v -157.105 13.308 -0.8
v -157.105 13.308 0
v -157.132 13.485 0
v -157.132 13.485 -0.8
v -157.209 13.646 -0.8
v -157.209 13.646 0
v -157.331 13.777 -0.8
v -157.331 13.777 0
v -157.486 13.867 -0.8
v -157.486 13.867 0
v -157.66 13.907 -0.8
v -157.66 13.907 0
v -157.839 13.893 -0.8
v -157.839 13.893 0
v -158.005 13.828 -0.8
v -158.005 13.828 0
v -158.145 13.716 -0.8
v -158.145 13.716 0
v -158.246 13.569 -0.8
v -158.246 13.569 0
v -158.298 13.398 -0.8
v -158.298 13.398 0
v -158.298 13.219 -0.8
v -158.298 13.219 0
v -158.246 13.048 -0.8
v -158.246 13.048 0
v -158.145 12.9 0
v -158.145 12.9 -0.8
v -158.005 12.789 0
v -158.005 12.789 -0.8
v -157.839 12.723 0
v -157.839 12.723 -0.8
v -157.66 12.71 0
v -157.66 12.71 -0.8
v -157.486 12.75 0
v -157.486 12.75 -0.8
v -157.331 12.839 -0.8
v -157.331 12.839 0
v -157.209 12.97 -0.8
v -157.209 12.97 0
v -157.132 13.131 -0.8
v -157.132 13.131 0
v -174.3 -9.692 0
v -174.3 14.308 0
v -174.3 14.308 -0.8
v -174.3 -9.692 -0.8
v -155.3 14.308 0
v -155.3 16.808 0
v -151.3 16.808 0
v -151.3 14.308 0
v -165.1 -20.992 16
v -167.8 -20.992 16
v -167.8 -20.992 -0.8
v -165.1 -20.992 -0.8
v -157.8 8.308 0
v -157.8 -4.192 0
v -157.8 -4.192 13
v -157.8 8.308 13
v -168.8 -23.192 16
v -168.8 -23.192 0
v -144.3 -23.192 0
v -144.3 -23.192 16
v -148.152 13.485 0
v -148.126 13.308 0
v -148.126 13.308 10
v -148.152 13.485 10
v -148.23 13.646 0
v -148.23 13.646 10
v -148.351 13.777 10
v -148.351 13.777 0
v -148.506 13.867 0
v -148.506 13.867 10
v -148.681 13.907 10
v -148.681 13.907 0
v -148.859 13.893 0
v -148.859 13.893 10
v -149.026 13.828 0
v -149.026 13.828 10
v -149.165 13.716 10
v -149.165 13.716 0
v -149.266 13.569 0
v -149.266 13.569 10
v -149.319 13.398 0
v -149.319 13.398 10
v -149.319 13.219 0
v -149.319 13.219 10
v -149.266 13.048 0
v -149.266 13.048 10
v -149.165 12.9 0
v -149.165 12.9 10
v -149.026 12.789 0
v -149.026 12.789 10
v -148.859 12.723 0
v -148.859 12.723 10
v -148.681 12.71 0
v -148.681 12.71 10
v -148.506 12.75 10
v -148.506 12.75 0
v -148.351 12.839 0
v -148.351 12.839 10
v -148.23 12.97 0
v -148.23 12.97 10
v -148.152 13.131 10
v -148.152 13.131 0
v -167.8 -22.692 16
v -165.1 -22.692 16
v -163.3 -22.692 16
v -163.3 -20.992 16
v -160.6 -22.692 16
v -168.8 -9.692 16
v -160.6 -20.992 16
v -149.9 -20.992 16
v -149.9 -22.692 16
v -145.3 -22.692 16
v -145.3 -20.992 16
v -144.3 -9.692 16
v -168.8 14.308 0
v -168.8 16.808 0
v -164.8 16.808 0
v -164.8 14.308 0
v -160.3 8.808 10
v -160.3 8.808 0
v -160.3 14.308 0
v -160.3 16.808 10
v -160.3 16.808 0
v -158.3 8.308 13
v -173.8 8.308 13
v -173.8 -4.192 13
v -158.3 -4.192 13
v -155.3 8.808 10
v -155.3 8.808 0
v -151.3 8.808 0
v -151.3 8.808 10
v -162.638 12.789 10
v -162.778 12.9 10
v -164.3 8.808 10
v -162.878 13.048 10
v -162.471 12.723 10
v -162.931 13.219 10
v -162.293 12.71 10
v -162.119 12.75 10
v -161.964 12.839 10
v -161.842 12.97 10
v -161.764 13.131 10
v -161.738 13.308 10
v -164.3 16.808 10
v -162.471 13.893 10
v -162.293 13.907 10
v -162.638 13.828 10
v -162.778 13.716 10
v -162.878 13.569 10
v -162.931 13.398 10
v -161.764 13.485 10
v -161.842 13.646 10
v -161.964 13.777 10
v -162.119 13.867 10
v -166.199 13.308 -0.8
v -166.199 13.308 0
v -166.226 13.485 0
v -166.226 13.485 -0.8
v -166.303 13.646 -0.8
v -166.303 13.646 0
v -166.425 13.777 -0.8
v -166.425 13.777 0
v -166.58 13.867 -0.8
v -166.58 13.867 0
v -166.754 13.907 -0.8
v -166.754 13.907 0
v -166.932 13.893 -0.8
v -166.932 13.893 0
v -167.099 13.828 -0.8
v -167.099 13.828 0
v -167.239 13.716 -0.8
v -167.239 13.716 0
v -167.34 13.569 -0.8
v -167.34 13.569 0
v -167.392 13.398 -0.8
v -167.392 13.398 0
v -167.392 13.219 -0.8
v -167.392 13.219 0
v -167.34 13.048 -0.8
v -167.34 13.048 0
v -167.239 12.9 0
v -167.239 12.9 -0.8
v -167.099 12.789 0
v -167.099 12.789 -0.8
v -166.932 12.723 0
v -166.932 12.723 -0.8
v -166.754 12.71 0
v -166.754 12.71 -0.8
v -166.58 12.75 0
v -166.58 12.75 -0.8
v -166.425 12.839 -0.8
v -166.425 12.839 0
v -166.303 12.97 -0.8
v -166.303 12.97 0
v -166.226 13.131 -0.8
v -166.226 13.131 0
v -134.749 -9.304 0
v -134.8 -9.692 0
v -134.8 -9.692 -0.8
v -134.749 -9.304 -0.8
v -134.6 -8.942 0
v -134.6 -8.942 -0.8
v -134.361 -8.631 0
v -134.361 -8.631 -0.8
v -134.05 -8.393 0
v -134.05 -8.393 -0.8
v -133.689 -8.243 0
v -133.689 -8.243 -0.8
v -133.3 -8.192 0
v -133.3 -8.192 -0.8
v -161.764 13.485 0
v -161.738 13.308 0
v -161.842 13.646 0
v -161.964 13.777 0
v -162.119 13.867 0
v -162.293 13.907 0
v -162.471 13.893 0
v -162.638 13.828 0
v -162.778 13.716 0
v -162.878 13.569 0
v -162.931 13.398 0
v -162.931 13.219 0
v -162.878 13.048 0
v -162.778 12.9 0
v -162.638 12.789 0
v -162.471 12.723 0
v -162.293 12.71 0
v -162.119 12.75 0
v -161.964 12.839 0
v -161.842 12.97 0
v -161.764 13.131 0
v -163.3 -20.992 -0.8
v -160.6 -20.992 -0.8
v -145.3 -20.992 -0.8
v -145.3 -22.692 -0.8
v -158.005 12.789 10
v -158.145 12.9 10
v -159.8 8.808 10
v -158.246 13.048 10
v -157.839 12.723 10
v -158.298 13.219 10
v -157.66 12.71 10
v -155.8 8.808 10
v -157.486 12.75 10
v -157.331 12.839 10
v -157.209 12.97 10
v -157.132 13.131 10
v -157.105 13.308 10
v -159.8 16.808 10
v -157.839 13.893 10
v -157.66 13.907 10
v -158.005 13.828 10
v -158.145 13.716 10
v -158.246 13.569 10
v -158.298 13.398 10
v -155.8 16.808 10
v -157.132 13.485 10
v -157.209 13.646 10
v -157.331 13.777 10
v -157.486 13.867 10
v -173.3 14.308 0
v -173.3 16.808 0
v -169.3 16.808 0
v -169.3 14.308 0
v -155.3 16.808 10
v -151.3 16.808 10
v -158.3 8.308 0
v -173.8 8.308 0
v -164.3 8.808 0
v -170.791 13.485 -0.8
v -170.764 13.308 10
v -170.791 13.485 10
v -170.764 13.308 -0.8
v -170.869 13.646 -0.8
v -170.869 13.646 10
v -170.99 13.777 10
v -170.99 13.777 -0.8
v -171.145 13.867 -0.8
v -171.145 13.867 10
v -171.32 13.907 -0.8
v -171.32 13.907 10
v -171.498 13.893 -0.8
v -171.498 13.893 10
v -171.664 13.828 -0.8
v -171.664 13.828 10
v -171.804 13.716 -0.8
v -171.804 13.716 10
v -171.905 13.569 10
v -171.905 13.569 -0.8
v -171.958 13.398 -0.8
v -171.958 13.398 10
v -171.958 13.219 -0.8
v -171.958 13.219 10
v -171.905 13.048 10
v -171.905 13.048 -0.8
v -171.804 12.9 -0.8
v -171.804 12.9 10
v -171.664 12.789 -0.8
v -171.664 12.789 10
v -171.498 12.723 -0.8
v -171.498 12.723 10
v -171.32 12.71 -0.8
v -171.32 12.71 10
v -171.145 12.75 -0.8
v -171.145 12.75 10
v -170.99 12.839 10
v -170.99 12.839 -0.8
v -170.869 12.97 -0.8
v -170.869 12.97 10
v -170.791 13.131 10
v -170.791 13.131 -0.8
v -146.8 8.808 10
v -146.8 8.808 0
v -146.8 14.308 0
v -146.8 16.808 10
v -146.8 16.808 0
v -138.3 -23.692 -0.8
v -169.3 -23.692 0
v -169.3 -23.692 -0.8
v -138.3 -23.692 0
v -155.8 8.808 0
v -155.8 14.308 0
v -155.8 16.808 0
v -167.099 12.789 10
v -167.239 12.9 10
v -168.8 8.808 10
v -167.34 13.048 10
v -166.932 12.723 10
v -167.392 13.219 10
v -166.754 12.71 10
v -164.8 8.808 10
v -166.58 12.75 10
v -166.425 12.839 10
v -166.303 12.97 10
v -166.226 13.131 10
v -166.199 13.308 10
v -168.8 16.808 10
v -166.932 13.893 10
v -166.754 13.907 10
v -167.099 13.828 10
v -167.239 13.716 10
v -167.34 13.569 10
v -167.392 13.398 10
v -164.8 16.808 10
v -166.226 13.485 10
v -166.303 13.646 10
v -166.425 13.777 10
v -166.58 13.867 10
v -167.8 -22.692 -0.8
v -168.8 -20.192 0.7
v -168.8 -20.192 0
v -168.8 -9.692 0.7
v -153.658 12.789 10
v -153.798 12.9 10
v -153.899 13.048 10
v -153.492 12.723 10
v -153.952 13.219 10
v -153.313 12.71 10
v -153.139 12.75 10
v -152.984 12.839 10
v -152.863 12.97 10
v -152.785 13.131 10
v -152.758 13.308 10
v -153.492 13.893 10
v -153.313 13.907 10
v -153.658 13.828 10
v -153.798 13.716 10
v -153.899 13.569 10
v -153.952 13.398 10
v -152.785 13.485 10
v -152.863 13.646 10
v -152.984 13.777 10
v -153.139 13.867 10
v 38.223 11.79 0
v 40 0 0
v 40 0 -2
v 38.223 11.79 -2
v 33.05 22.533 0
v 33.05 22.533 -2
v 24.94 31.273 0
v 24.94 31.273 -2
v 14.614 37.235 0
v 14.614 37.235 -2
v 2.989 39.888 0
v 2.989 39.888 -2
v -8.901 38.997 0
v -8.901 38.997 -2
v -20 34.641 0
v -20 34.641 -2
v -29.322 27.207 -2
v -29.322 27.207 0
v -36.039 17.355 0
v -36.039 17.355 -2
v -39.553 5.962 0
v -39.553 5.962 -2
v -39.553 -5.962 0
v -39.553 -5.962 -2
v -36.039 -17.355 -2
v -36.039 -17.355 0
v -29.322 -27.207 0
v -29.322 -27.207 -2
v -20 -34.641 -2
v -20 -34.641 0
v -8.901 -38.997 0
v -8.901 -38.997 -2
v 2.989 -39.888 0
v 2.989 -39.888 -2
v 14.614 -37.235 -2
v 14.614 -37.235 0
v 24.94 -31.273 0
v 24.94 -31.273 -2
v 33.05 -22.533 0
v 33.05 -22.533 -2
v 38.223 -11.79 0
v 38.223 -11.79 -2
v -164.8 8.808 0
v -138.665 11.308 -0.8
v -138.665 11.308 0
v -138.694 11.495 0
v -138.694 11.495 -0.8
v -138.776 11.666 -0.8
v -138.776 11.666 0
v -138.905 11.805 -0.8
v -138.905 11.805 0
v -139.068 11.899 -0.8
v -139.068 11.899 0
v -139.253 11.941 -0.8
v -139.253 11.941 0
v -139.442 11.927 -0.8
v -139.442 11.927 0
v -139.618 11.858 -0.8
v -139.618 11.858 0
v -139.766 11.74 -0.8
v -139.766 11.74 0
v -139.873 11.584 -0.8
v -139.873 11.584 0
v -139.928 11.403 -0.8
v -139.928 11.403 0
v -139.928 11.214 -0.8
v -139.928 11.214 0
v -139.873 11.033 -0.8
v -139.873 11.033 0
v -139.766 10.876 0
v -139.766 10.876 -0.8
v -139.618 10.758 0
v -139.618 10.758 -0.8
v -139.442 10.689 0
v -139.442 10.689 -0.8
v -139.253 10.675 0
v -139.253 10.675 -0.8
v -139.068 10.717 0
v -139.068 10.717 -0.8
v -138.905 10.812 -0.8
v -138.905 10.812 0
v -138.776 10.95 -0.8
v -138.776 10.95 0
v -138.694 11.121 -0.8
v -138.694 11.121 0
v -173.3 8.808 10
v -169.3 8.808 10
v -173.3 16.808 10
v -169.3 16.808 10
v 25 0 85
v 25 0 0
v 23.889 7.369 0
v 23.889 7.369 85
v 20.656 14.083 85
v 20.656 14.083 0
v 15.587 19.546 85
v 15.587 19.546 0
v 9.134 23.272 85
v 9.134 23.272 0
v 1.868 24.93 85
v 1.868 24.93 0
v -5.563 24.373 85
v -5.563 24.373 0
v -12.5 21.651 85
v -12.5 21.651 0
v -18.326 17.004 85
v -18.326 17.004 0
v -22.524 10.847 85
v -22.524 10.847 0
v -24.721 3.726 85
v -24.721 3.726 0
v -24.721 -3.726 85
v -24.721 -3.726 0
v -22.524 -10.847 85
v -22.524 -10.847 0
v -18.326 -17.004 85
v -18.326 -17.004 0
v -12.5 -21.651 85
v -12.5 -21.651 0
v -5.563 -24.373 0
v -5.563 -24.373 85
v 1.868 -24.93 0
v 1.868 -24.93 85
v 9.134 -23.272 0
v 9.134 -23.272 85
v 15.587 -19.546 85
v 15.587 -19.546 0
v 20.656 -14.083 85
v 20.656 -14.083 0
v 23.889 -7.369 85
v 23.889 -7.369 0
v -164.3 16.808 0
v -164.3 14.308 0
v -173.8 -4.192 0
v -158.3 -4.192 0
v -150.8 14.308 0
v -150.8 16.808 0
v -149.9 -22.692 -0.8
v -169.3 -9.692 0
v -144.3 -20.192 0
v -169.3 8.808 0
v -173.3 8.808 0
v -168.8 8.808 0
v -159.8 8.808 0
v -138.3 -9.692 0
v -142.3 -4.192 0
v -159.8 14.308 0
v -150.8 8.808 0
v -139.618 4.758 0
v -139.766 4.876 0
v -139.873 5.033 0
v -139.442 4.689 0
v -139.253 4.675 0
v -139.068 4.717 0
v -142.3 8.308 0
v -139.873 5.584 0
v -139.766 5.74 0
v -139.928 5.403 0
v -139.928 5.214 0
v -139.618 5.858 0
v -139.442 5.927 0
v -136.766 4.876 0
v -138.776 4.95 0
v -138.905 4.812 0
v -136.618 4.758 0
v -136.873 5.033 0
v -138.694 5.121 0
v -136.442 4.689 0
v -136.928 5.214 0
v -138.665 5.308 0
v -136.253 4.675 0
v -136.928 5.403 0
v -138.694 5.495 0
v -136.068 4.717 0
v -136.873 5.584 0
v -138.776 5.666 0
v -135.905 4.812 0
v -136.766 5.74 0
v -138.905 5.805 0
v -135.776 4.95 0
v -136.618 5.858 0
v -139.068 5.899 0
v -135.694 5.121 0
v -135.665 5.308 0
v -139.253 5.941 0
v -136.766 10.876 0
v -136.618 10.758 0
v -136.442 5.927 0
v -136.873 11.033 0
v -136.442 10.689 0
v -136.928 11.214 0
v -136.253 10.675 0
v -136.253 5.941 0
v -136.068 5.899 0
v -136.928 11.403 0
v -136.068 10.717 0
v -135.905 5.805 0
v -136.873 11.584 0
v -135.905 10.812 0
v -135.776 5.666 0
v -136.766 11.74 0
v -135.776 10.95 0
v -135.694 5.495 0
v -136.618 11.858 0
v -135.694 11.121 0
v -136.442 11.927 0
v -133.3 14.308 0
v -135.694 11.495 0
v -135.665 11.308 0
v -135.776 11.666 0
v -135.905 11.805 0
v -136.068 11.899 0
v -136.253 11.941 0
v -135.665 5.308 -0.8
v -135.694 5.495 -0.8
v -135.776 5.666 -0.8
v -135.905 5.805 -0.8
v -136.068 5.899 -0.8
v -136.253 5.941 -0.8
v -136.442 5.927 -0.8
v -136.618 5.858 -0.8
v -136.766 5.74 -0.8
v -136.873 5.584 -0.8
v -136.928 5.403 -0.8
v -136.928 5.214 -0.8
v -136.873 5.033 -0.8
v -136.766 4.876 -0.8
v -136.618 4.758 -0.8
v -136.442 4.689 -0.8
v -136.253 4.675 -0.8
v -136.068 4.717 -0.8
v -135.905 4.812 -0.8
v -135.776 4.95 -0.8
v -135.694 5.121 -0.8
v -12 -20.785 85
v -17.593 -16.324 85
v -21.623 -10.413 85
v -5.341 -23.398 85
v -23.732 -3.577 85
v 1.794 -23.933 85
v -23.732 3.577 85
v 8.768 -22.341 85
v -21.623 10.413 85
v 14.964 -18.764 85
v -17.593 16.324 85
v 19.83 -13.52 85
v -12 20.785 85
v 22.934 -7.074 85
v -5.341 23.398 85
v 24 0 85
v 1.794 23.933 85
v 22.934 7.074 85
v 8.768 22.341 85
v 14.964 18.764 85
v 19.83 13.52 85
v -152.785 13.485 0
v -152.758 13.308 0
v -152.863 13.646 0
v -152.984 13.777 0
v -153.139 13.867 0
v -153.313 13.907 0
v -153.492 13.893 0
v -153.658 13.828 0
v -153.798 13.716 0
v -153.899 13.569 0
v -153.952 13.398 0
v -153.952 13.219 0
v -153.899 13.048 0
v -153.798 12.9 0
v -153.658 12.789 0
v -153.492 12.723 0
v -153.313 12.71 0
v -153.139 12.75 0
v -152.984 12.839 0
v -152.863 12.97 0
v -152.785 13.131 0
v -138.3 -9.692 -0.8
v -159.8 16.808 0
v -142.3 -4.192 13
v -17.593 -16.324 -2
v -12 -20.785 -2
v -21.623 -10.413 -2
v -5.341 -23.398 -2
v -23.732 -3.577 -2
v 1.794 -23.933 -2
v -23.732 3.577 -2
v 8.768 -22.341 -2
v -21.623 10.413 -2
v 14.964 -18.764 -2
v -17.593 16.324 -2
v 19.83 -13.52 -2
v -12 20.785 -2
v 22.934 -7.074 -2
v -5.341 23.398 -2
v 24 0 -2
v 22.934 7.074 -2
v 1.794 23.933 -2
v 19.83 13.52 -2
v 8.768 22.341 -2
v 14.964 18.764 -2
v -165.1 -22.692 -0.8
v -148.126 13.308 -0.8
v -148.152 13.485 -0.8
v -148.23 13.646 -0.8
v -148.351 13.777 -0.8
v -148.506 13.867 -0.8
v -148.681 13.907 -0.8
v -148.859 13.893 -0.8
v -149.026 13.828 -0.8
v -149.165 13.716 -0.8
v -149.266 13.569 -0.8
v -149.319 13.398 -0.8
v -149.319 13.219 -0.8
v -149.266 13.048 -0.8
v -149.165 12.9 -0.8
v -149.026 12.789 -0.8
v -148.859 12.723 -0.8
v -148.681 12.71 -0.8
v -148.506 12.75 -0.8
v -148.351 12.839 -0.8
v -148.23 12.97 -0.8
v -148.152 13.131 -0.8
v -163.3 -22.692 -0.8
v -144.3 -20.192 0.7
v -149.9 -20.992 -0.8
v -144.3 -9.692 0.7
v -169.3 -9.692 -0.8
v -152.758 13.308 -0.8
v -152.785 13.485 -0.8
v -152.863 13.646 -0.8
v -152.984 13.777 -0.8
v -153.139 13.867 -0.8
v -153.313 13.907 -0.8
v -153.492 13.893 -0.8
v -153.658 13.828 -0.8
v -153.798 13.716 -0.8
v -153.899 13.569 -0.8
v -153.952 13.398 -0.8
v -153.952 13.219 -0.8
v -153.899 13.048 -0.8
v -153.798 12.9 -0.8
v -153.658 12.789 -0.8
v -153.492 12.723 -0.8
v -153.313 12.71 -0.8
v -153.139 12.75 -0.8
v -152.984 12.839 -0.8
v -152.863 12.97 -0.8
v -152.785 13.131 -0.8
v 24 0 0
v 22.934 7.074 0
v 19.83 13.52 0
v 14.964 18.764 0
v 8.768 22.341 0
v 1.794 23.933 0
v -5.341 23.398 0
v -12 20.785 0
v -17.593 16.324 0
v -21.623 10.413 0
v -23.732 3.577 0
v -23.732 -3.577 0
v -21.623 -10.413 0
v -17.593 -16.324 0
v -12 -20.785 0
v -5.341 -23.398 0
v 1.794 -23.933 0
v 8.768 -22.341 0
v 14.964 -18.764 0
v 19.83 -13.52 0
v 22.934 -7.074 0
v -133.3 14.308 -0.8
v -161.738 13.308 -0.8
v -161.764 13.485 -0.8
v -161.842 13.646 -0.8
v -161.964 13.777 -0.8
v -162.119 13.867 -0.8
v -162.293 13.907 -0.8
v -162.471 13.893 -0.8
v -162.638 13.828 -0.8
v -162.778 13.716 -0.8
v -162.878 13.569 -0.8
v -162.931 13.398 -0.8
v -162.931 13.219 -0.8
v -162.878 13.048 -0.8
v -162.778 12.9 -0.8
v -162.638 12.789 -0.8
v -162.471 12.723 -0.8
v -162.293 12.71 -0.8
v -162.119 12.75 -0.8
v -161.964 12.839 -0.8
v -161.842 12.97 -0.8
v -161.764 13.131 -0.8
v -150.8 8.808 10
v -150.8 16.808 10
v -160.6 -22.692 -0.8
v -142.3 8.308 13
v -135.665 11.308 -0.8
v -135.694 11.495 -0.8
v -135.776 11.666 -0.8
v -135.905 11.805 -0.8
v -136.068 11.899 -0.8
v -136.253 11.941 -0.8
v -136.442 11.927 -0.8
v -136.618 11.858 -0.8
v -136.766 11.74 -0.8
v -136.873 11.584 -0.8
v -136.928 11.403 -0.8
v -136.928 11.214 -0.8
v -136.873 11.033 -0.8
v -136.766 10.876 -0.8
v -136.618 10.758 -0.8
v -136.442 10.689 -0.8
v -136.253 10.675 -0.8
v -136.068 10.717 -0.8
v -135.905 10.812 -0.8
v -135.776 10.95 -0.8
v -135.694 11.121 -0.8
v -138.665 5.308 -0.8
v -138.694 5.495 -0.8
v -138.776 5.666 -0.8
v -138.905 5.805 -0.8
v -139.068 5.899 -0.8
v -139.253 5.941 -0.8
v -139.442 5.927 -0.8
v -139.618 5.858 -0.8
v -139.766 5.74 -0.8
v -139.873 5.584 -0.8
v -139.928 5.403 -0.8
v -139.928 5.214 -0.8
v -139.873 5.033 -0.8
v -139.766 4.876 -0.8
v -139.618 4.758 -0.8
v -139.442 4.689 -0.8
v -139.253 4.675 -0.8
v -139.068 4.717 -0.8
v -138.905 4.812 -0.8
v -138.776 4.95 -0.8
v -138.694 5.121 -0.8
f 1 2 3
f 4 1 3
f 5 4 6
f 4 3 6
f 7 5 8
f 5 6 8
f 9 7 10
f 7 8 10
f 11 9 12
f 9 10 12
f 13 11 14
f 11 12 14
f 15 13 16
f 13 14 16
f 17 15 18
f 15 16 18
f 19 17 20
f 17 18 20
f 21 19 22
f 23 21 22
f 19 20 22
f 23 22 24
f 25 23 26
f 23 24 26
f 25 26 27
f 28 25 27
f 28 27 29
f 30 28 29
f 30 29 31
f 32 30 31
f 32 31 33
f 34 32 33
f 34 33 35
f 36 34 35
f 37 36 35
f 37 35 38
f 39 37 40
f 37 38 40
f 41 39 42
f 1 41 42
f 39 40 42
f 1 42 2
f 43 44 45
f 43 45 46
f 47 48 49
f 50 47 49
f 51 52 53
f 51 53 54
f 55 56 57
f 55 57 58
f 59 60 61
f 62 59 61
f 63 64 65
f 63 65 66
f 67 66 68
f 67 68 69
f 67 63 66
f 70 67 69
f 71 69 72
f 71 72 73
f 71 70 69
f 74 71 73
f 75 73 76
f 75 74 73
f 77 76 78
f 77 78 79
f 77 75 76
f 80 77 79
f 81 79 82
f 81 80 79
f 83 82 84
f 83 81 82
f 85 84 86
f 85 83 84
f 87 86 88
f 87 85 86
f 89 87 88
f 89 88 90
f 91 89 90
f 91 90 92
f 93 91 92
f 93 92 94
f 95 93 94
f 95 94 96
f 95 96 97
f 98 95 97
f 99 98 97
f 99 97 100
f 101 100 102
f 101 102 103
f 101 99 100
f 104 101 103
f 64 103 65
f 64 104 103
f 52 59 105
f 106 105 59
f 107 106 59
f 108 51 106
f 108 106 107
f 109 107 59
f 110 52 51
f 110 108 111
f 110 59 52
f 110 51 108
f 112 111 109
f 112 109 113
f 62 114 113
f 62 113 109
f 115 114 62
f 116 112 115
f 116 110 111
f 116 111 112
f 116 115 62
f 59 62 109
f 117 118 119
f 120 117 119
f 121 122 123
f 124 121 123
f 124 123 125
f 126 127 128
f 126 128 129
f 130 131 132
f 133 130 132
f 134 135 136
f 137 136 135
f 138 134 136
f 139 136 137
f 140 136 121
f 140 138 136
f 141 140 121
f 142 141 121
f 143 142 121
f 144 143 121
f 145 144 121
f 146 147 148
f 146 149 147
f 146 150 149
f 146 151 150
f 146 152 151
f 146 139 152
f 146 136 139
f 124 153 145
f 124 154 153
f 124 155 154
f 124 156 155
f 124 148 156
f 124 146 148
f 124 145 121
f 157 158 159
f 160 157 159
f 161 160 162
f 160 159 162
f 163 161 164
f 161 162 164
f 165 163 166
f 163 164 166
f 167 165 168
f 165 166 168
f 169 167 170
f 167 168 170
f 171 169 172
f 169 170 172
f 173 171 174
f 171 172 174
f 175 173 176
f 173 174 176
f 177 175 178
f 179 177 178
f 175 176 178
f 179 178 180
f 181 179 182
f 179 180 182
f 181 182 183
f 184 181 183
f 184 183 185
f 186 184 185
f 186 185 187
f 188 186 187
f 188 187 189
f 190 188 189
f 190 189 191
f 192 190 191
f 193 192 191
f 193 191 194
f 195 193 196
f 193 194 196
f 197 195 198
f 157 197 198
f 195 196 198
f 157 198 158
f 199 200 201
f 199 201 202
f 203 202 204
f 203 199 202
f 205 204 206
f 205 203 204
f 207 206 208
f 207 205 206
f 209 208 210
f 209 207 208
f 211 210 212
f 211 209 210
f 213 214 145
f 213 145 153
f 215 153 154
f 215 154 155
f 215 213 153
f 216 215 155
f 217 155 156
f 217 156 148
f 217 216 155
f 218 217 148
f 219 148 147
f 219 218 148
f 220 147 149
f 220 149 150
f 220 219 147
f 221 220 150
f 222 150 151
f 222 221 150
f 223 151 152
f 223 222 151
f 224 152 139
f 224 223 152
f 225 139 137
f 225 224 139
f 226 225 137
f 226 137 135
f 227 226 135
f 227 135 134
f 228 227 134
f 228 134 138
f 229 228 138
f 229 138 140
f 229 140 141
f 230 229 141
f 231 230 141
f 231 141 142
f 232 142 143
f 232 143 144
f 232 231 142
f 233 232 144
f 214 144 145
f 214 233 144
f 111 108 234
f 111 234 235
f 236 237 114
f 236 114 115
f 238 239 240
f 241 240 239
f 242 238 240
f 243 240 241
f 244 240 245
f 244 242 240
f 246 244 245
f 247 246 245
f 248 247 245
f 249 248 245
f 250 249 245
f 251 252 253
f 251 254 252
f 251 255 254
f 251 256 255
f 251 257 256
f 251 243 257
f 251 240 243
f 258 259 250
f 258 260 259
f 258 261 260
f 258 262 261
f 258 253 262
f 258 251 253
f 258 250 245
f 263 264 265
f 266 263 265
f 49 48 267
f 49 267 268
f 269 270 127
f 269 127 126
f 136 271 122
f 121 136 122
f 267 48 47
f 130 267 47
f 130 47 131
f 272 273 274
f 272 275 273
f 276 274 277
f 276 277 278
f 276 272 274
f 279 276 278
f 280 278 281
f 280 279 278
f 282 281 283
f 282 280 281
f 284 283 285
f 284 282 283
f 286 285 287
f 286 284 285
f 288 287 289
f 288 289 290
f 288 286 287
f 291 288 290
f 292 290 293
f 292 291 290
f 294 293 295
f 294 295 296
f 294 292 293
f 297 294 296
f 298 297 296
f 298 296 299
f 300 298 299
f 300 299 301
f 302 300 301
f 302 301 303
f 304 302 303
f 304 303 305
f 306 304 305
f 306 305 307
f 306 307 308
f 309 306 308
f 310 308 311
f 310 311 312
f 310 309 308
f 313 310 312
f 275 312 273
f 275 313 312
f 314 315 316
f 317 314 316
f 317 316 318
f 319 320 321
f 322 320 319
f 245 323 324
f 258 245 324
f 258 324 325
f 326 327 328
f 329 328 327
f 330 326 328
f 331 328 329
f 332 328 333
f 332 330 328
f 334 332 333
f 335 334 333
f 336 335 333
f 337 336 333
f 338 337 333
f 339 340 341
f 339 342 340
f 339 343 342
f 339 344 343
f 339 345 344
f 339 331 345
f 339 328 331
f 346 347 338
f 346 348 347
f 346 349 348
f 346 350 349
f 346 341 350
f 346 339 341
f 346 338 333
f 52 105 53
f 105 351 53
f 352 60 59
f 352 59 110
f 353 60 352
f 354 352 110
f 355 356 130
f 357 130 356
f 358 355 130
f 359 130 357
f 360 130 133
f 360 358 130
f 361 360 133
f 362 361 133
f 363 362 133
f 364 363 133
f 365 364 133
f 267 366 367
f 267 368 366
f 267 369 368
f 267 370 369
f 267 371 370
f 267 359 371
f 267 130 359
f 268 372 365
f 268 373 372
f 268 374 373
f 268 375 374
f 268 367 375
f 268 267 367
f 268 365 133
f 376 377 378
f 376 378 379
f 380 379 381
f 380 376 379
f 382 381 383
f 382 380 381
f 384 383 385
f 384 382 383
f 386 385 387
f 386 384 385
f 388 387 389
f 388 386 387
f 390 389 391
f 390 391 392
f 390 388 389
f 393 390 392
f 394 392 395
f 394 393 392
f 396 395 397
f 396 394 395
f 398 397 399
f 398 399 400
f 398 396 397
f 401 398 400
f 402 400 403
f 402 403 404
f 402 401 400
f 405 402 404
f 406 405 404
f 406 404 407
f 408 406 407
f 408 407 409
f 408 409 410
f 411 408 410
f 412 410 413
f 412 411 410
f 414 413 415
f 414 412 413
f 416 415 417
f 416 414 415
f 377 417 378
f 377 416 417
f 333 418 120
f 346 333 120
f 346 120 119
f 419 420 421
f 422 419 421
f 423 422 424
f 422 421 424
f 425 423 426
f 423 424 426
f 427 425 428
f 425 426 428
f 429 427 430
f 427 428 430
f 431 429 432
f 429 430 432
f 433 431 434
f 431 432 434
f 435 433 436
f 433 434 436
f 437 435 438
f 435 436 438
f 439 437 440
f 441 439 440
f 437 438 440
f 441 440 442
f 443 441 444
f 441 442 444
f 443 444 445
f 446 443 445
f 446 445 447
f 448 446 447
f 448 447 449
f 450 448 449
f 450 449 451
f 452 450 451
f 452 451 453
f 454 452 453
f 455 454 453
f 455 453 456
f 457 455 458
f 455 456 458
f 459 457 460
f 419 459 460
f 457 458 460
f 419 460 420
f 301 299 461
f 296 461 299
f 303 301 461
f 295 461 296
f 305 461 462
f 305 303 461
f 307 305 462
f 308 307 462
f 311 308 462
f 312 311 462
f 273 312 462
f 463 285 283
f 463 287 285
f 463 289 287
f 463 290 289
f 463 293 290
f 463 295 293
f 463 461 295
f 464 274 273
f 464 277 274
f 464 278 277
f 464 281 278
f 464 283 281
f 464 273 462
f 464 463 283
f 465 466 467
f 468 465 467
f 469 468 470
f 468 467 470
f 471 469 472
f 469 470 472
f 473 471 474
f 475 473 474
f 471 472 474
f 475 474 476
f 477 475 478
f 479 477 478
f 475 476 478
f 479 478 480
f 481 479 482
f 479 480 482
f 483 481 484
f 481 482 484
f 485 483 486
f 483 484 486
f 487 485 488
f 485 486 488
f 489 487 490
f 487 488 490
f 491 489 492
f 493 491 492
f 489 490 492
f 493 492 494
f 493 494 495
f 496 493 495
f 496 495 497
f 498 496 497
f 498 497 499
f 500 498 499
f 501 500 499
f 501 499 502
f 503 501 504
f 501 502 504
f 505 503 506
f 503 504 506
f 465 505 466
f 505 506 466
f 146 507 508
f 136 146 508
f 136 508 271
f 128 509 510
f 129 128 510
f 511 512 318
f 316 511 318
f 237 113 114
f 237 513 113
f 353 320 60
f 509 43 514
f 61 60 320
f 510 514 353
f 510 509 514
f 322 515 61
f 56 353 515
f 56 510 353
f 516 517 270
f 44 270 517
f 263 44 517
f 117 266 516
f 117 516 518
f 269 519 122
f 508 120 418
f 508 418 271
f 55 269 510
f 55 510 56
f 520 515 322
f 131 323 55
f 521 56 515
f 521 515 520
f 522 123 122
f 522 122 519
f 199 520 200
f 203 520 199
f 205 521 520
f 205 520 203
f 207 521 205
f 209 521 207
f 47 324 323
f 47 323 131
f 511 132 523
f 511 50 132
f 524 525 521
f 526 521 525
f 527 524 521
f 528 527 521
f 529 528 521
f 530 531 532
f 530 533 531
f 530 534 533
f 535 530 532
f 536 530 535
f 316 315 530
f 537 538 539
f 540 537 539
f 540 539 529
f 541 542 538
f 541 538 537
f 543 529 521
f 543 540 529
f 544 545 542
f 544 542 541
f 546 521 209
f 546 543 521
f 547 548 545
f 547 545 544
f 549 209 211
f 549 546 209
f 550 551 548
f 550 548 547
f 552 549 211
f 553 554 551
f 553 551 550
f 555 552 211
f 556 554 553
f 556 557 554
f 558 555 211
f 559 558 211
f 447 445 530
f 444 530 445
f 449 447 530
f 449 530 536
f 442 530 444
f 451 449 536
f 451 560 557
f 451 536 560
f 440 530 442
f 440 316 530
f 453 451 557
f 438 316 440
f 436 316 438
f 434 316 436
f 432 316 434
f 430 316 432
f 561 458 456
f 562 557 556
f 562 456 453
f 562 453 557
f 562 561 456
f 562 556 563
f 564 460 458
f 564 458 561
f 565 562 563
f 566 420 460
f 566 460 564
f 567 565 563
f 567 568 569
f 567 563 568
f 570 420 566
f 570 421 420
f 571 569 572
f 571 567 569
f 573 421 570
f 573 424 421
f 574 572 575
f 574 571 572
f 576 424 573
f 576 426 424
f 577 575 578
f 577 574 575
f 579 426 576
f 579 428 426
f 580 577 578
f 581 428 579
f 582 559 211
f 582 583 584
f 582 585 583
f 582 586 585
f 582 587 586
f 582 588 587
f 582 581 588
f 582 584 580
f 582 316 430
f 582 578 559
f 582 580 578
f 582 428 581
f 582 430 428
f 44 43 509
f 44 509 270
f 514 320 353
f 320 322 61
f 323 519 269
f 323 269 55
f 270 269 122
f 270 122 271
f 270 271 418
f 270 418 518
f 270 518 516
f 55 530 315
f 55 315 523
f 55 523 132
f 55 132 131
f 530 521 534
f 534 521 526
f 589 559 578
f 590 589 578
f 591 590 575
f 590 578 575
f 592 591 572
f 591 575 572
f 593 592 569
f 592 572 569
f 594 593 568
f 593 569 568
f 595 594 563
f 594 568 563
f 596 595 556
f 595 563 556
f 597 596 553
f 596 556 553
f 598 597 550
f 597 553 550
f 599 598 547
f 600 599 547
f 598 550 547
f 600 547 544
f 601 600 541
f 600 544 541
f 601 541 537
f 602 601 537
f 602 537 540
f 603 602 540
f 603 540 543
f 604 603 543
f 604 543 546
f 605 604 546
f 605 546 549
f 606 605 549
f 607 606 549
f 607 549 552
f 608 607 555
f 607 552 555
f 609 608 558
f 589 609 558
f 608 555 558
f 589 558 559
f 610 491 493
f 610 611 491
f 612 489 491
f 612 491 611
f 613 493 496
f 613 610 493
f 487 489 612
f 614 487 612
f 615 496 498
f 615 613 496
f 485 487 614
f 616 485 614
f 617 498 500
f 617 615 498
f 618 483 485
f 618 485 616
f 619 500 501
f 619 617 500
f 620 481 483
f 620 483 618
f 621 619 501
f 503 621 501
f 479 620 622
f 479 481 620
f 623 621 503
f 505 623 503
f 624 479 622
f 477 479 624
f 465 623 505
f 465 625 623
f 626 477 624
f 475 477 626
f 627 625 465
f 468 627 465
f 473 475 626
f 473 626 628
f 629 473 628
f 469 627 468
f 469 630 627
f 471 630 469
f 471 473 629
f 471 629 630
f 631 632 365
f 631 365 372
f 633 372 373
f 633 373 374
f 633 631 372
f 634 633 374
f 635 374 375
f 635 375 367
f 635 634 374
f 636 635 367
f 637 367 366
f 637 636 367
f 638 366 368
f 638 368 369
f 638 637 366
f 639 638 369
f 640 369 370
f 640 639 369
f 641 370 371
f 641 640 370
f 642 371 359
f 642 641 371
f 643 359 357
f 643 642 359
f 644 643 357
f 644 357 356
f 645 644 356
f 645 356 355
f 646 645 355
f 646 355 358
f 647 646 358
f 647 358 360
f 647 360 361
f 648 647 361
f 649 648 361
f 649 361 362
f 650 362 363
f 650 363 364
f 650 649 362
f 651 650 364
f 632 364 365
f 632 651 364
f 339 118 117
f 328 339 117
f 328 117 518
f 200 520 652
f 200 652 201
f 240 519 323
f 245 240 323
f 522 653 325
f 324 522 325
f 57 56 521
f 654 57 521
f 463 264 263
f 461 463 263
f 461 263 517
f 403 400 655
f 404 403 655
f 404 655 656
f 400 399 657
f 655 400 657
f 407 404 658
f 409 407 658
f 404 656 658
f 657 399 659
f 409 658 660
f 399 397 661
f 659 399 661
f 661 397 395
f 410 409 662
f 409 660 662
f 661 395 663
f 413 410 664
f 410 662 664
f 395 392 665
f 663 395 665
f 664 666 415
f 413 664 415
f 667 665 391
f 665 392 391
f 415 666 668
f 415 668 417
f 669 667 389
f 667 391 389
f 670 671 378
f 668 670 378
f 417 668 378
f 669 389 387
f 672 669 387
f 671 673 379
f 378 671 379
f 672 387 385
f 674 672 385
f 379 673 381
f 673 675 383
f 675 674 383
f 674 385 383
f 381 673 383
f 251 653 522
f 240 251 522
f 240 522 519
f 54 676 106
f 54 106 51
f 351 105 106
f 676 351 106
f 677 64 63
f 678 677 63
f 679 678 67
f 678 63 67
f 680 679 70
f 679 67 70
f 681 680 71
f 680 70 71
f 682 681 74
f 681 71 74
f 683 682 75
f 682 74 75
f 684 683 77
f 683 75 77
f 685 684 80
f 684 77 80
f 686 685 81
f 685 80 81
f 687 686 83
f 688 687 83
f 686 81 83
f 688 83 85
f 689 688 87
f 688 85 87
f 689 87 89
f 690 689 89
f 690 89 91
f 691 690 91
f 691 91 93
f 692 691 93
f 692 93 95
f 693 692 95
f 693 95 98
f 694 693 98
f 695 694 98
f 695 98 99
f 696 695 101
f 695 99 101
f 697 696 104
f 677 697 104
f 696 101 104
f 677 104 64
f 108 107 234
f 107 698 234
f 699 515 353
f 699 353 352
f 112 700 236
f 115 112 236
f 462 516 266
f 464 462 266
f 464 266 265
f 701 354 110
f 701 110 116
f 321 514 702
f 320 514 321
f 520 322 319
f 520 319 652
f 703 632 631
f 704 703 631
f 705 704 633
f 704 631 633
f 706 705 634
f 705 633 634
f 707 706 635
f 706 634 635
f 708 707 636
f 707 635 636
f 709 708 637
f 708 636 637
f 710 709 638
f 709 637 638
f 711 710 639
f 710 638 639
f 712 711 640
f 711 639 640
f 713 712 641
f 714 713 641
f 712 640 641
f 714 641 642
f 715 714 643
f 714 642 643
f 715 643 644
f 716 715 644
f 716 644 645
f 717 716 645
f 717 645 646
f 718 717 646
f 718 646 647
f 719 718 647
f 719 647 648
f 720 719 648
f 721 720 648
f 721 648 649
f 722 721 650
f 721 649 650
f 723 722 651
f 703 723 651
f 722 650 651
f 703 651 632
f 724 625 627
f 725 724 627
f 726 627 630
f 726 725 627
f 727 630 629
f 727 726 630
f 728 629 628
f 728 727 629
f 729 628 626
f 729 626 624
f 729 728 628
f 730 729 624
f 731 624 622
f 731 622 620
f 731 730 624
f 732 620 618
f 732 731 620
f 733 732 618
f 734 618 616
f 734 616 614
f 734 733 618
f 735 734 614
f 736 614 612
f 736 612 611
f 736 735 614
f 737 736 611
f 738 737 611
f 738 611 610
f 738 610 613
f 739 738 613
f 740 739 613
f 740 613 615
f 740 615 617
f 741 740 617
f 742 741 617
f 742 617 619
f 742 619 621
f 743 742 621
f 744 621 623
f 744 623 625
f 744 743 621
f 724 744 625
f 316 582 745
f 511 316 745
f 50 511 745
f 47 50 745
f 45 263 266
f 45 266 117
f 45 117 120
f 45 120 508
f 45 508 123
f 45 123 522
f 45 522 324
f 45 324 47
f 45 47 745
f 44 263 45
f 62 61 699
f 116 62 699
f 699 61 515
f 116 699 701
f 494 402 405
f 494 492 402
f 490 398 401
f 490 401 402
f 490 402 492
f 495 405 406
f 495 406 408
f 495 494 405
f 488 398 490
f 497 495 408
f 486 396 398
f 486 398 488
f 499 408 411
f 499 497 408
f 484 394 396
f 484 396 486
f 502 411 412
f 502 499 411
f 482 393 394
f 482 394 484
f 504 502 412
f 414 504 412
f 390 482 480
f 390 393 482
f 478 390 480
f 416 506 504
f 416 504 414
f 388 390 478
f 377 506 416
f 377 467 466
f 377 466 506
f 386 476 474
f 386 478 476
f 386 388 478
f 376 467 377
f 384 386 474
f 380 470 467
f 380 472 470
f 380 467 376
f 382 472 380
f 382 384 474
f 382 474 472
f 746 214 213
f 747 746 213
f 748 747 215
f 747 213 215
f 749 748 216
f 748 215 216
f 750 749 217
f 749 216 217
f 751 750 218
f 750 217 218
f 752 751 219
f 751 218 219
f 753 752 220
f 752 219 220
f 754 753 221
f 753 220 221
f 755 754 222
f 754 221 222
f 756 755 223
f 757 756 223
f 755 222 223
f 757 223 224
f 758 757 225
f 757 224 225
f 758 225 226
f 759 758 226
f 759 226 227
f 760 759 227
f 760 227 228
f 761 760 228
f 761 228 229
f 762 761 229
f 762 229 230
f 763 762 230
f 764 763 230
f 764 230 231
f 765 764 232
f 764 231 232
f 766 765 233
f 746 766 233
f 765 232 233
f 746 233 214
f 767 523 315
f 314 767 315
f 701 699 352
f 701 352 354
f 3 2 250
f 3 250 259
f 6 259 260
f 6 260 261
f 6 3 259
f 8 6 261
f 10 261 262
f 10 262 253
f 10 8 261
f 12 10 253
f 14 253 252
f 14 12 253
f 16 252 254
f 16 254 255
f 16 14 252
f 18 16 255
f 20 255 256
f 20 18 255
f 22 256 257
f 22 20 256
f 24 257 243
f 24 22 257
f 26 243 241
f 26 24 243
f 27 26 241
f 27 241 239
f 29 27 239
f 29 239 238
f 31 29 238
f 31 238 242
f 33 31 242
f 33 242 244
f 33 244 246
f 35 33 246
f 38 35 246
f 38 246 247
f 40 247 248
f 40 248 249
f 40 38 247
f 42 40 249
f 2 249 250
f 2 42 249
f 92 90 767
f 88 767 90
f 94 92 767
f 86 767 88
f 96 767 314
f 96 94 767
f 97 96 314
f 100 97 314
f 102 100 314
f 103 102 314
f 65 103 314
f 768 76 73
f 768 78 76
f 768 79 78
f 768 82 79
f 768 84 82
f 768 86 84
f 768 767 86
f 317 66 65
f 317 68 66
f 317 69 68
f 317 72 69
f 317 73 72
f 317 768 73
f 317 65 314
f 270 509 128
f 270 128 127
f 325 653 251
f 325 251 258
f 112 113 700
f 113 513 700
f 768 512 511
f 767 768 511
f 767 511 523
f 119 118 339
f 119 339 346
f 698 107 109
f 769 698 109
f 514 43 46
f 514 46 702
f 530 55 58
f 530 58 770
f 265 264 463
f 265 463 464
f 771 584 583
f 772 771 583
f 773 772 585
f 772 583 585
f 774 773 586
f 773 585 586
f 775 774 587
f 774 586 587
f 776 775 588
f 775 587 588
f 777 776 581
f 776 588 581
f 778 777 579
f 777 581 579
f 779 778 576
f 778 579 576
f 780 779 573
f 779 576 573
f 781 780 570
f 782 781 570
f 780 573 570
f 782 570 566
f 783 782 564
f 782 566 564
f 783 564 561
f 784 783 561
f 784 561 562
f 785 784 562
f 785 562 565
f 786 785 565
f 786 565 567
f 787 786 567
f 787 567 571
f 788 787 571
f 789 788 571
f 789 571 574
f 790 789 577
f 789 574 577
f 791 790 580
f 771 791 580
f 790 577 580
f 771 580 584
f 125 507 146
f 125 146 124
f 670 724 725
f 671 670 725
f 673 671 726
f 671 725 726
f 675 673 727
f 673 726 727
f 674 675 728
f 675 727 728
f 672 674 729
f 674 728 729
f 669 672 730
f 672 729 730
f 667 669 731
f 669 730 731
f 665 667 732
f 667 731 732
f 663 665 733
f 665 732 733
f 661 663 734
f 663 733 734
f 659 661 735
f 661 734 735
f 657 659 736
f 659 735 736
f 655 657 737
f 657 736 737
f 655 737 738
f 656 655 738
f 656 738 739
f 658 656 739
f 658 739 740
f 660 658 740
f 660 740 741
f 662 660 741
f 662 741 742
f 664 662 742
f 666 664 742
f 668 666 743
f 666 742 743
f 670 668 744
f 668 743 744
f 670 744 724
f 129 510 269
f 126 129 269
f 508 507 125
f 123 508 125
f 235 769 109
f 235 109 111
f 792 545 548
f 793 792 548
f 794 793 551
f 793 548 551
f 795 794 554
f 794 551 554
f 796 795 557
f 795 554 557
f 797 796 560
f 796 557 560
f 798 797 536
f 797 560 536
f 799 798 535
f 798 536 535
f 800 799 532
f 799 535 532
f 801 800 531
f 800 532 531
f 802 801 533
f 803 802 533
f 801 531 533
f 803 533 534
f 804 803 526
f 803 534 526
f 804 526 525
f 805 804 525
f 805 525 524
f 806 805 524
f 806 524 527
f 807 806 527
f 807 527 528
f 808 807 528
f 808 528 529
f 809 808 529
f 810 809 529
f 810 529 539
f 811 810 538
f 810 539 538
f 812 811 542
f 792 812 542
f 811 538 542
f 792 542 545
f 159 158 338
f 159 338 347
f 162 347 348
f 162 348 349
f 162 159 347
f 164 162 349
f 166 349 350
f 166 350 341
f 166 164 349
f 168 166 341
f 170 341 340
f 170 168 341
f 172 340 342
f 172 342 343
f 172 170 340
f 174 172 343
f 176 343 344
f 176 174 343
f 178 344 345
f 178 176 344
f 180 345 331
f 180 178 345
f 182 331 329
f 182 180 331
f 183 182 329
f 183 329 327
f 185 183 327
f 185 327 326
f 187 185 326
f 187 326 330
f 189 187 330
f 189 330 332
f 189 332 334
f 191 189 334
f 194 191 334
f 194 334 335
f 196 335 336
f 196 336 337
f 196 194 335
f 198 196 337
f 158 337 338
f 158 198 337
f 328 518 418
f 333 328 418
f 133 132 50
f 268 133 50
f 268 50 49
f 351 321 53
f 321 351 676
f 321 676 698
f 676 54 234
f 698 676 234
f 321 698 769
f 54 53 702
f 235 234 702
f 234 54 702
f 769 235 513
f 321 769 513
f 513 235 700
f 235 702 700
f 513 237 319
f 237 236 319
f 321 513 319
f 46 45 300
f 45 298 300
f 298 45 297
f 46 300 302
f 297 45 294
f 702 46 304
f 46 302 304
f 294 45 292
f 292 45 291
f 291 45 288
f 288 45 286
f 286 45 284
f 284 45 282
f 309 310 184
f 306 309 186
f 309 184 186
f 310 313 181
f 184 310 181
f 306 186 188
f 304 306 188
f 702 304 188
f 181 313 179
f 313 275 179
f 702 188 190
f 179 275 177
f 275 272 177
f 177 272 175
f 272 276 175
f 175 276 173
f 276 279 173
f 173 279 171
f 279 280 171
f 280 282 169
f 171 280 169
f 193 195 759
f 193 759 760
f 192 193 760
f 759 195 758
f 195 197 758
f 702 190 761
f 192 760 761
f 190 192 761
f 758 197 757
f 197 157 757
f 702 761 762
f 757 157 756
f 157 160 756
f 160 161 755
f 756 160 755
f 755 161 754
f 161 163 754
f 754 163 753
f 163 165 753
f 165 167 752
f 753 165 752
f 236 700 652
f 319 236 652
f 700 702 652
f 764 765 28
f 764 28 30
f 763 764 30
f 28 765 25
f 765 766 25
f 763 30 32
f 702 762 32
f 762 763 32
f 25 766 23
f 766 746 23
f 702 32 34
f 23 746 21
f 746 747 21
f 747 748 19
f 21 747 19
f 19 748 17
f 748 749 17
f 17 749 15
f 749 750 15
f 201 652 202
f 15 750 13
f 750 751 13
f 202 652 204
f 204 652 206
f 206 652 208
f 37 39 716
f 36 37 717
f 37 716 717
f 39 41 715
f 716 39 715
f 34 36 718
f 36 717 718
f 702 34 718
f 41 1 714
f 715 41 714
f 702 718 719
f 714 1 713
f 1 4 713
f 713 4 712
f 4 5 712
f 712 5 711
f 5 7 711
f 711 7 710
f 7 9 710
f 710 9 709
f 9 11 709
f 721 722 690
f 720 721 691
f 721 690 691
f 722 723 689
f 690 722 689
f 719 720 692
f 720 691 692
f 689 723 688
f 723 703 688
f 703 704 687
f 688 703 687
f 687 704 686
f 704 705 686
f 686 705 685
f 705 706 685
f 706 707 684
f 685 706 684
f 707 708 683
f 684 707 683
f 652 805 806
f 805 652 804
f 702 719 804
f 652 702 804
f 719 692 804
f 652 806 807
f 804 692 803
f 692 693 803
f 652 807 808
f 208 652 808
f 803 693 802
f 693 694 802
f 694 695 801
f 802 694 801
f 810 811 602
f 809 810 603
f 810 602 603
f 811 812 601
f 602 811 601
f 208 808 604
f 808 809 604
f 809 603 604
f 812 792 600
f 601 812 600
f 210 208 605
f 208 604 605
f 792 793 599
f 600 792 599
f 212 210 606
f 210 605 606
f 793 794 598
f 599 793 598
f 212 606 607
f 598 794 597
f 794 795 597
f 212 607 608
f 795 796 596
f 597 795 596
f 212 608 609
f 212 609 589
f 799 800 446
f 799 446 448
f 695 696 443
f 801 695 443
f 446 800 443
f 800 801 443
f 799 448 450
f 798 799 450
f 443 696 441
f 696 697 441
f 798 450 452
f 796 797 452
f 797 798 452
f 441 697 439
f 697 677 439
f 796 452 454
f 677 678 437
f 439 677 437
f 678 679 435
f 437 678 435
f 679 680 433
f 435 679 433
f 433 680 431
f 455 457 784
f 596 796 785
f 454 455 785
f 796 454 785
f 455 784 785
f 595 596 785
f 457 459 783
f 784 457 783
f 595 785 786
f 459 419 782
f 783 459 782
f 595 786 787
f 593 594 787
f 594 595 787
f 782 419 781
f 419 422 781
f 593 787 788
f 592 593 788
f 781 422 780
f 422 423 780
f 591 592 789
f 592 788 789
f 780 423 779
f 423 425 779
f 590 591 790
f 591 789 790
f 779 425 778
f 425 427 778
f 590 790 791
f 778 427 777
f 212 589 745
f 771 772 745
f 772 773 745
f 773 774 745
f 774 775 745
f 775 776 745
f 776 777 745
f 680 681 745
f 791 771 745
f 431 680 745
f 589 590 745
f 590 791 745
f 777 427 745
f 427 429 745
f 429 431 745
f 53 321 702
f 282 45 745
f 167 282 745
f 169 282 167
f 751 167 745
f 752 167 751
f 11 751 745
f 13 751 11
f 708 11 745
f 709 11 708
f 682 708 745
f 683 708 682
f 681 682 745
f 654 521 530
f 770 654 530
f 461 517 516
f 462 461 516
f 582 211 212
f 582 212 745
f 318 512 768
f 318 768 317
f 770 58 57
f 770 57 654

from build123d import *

# Parameters (mm, degrees)
F0_R     = 25
F0_R_2   = 24
F1_DEPTH = 85
F0_R_3   = 40
F2_DEPTH = 2
F3_W     = 24.5
F3_H     = 13.5
F3_W_2   = 15.5
F3_H_2   = 12.5
F3_R     = 0.635
F3_W_3   = 2.7
F3_H_3   = 1.7
F3_W_4   = 4.6
F3_W_5   = 4
F3_H_4   = 5.5
F3_R_2   = 0.6
F3_W_6   = 0.5
F4_DEPTH = 0.8
F5_DEPTH = 13
F3_H_5   = 2.5
F6_DEPTH = 10
F7_DEPTH = 16
F8_W     = 10.5
F8_H     = 0.7
F9_DEPTH = 25


with BuildPart() as f1:
    # F0 (on Top) → F1 (new body)
    with BuildSketch(Plane.XY):
        Circle(F0_R)
        Circle(F0_R_2, mode=Mode.SUBTRACT)
    extrude(amount=F1_DEPTH)

    # F0 (on Top) → F2 (join)
    with BuildSketch(Plane.XY):
        Circle(F0_R_3)
        Circle(F0_R, mode=Mode.SUBTRACT)
        Circle(F0_R)
        Circle(F0_R_2, mode=Mode.SUBTRACT)
    extrude(amount=-F2_DEPTH)


with BuildPart() as f4:
    # F3 (on Top) → F4 (new body)
    with BuildSketch(Plane.XY):
        with BuildLine():
            Line((-173.800483346, 14.3081960443), (-174.300483346, 14.3081960443))
            Line((-174.300483346, 14.3081960443), (-174.300483346, -9.6918039557))
            Line((-174.300483346, -9.6918039557), (-169.300483346, -9.6918039557))
            Line((-169.300483346, -9.6918039557), (-169.300483346, -23.6918039557))
            Line((-169.300483346, -23.6918039557), (-138.300483346, -23.6918039557))
            Line((-138.300483346, -23.6918039557), (-138.300483346, -9.6918039557))
            Line((-138.300483346, -9.6918039557), (-134.800483346, -9.6918039557))
            ThreePointArc((-134.800483346, -9.6918039557), (-134.3611435178, -8.6311437839), (-133.300483346, -8.1918039557))
            Line((-133.300483346, -8.1918039557), (-133.300483346, 14.3081960443))
            Line((-133.300483346, 14.3081960443), (-146.300483346, 14.3081960443))
            Line((-146.300483346, 14.3081960443), (-146.300483346, 8.8081960443))
            Line((-146.300483346, 8.8081960443), (-146.800483346, 8.8081960443))
            Line((-146.800483346, 8.8081960443), (-150.800483346, 8.8081960443))
            Line((-150.800483346, 8.8081960443), (-151.300483346, 8.8081960443))
            Line((-151.300483346, 8.8081960443), (-155.300483346, 8.8081960443))
            Line((-155.300483346, 8.8081960443), (-155.800483346, 8.8081960443))
            Line((-155.800483346, 8.8081960443), (-159.800483346, 8.8081960443))
            Line((-159.800483346, 8.8081960443), (-160.300483346, 8.8081960443))
            Line((-160.300483346, 8.8081960443), (-164.300483346, 8.8081960443))
            Line((-164.300483346, 8.8081960443), (-164.800483346, 8.8081960443))
            Line((-164.800483346, 8.8081960443), (-168.800483346, 8.8081960443))
            Line((-168.800483346, 8.8081960443), (-169.300483346, 8.8081960443))
            Line((-169.300483346, 8.8081960443), (-173.300483346, 8.8081960443))
            Line((-173.300483346, 8.8081960443), (-173.800483346, 8.8081960443))
            Line((-173.800483346, 8.8081960443), (-173.800483346, 14.3081960443))
        make_face()
        with Locations((-156.550483346, -16.4418039557)):
            Rectangle(F3_W, F3_H, mode=Mode.SUBTRACT)
        with Locations((-166.050483346, 2.0581960443)):
            Rectangle(F3_W_2, F3_H_2, mode=Mode.SUBTRACT)
        with Locations((-150.050483346, 2.0581960443)):
            Rectangle(F3_W_2, F3_H_2, mode=Mode.SUBTRACT)
        with Locations((-139.300483346, 5.3081960443)):
            Circle(F3_R, mode=Mode.SUBTRACT)
        with Locations((-136.300483346, 5.3081960443)):
            Circle(F3_R, mode=Mode.SUBTRACT)
        with Locations((-139.300483346, 11.3081960443)):
            Circle(F3_R, mode=Mode.SUBTRACT)
        with Locations((-136.300483346, 11.3081960443)):
            Circle(F3_R, mode=Mode.SUBTRACT)
        with Locations((-156.550483346, -16.4418039557)):
            Rectangle(F3_W, F3_H)
        with Locations((-166.450483346, -21.8418039557)):
            Rectangle(F3_W_3, F3_H_3, mode=Mode.SUBTRACT)
        with Locations((-161.950483346, -21.8418039557)):
            Rectangle(F3_W_3, F3_H_3, mode=Mode.SUBTRACT)
        with Locations((-147.600483346, -21.8418039557)):
            Rectangle(F3_W_4, F3_H_3, mode=Mode.SUBTRACT)
        with Locations((-166.050483346, 2.0581960443)):
            Rectangle(F3_W_2, F3_H_2)
        with Locations((-150.050483346, 2.0581960443)):
            Rectangle(F3_W_2, F3_H_2)
        with Locations((-171.300483346, 11.5581960443)):
            Rectangle(F3_W_5, F3_H_4)
        with Locations((-171.3644564152, 13.3081960443)):
            Circle(F3_R_2, mode=Mode.SUBTRACT)
        with Locations((-166.800483346, 11.5581960443)):
            Rectangle(F3_W_5, F3_H_4)
        with Locations((-166.7989343405, 13.3081960443)):
            Circle(F3_R_2, mode=Mode.SUBTRACT)
        with Locations((-162.300483346, 11.5581960443)):
            Rectangle(F3_W_5, F3_H_4)
        with Locations((-162.3377650976, 13.3081960443)):
            Circle(F3_R_2, mode=Mode.SUBTRACT)
        with Locations((-157.800483346, 11.5581960443)):
            Rectangle(F3_W_5, F3_H_4)
        with Locations((-157.7050238848, 13.3081960443)):
            Circle(F3_R_2, mode=Mode.SUBTRACT)
        with Locations((-153.300483346, 11.5581960443)):
            Rectangle(F3_W_5, F3_H_4)
        with Locations((-153.3582508564, 13.3081960443)):
            Circle(F3_R_2, mode=Mode.SUBTRACT)
        with Locations((-148.800483346, 11.5581960443)):
            Rectangle(F3_W_5, F3_H_4)
        with Locations((-148.7255096436, 13.3081960443)):
            Circle(F3_R_2, mode=Mode.SUBTRACT)
        with Locations((-173.550483346, 11.5581960443)):
            Rectangle(F3_W_6, F3_H_4)
        with Locations((-169.050483346, 11.5581960443)):
            Rectangle(F3_W_6, F3_H_4)
        with Locations((-164.550483346, 11.5581960443)):
            Rectangle(F3_W_6, F3_H_4)
        with Locations((-160.050483346, 11.5581960443)):
            Rectangle(F3_W_6, F3_H_4)
        with Locations((-155.550483346, 11.5581960443)):
            Rectangle(F3_W_6, F3_H_4)
        with Locations((-151.050483346, 11.5581960443)):
            Rectangle(F3_W_6, F3_H_4)
        with Locations((-146.550483346, 11.5581960443)):
            Rectangle(F3_W_6, F3_H_4)
    extrude(amount=-F4_DEPTH)

    # F3 (on Top) → F5 (join)
    with BuildSketch(Plane.XY):
        with Locations((-166.050483346, 2.0581960443)):
            Rectangle(F3_W_2, F3_H_2)
        with Locations((-150.050483346, 2.0581960443)):
            Rectangle(F3_W_2, F3_H_2)
    extrude(amount=F5_DEPTH)

    # F3 (on Top) → F6 (join)
    with BuildSketch(Plane.XY):
        with Locations((-171.300483346, 11.5581960443)):
            Rectangle(F3_W_5, F3_H_4)
        with Locations((-171.3644564152, 13.3081960443)):
            Circle(F3_R_2, mode=Mode.SUBTRACT)
        with Locations((-171.300483346, 15.5581960443)):
            Rectangle(F3_W_5, F3_H_5)
        with Locations((-166.800483346, 15.5581960443)):
            Rectangle(F3_W_5, F3_H_5)
        with Locations((-166.800483346, 11.5581960443)):
            Rectangle(F3_W_5, F3_H_4)
        with Locations((-166.7989343405, 13.3081960443)):
            Circle(F3_R_2, mode=Mode.SUBTRACT)
        with Locations((-162.300483346, 15.5581960443)):
            Rectangle(F3_W_5, F3_H_5)
        with Locations((-162.300483346, 11.5581960443)):
            Rectangle(F3_W_5, F3_H_4)
        with Locations((-162.3377650976, 13.3081960443)):
            Circle(F3_R_2, mode=Mode.SUBTRACT)
        with Locations((-157.800483346, 11.5581960443)):
            Rectangle(F3_W_5, F3_H_4)
        with Locations((-157.7050238848, 13.3081960443)):
            Circle(F3_R_2, mode=Mode.SUBTRACT)
        with Locations((-157.800483346, 15.5581960443)):
            Rectangle(F3_W_5, F3_H_5)
        with Locations((-153.300483346, 11.5581960443)):
            Rectangle(F3_W_5, F3_H_4)
        with Locations((-153.3582508564, 13.3081960443)):
            Circle(F3_R_2, mode=Mode.SUBTRACT)
        with Locations((-153.300483346, 15.5581960443)):
            Rectangle(F3_W_5, F3_H_5)
        with Locations((-148.800483346, 15.5581960443)):
            Rectangle(F3_W_5, F3_H_5)
        with Locations((-148.800483346, 11.5581960443)):
            Rectangle(F3_W_5, F3_H_4)
        with Locations((-148.7255096436, 13.3081960443)):
            Circle(F3_R_2, mode=Mode.SUBTRACT)
    extrude(amount=F6_DEPTH)

    # F3 (on Top) → F7 (join)
    with BuildSketch(Plane.XY):
        with Locations((-156.550483346, -16.4418039557)):
            Rectangle(F3_W, F3_H)
        with Locations((-166.450483346, -21.8418039557)):
            Rectangle(F3_W_3, F3_H_3, mode=Mode.SUBTRACT)
        with Locations((-161.950483346, -21.8418039557)):
            Rectangle(F3_W_3, F3_H_3, mode=Mode.SUBTRACT)
        with Locations((-147.600483346, -21.8418039557)):
            Rectangle(F3_W_4, F3_H_3, mode=Mode.SUBTRACT)
    extrude(amount=F7_DEPTH)

    # F8 (on face) → F9 (cut)
    with BuildSketch(Plane.YZ.offset(-144.300483346)):
        with Locations((-14.9418039557, 0.35)):
            Rectangle(F8_W, F8_H)
    extrude(amount=-F9_DEPTH, mode=Mode.SUBTRACT)


solid = Compound([f1.part, f4.part])
